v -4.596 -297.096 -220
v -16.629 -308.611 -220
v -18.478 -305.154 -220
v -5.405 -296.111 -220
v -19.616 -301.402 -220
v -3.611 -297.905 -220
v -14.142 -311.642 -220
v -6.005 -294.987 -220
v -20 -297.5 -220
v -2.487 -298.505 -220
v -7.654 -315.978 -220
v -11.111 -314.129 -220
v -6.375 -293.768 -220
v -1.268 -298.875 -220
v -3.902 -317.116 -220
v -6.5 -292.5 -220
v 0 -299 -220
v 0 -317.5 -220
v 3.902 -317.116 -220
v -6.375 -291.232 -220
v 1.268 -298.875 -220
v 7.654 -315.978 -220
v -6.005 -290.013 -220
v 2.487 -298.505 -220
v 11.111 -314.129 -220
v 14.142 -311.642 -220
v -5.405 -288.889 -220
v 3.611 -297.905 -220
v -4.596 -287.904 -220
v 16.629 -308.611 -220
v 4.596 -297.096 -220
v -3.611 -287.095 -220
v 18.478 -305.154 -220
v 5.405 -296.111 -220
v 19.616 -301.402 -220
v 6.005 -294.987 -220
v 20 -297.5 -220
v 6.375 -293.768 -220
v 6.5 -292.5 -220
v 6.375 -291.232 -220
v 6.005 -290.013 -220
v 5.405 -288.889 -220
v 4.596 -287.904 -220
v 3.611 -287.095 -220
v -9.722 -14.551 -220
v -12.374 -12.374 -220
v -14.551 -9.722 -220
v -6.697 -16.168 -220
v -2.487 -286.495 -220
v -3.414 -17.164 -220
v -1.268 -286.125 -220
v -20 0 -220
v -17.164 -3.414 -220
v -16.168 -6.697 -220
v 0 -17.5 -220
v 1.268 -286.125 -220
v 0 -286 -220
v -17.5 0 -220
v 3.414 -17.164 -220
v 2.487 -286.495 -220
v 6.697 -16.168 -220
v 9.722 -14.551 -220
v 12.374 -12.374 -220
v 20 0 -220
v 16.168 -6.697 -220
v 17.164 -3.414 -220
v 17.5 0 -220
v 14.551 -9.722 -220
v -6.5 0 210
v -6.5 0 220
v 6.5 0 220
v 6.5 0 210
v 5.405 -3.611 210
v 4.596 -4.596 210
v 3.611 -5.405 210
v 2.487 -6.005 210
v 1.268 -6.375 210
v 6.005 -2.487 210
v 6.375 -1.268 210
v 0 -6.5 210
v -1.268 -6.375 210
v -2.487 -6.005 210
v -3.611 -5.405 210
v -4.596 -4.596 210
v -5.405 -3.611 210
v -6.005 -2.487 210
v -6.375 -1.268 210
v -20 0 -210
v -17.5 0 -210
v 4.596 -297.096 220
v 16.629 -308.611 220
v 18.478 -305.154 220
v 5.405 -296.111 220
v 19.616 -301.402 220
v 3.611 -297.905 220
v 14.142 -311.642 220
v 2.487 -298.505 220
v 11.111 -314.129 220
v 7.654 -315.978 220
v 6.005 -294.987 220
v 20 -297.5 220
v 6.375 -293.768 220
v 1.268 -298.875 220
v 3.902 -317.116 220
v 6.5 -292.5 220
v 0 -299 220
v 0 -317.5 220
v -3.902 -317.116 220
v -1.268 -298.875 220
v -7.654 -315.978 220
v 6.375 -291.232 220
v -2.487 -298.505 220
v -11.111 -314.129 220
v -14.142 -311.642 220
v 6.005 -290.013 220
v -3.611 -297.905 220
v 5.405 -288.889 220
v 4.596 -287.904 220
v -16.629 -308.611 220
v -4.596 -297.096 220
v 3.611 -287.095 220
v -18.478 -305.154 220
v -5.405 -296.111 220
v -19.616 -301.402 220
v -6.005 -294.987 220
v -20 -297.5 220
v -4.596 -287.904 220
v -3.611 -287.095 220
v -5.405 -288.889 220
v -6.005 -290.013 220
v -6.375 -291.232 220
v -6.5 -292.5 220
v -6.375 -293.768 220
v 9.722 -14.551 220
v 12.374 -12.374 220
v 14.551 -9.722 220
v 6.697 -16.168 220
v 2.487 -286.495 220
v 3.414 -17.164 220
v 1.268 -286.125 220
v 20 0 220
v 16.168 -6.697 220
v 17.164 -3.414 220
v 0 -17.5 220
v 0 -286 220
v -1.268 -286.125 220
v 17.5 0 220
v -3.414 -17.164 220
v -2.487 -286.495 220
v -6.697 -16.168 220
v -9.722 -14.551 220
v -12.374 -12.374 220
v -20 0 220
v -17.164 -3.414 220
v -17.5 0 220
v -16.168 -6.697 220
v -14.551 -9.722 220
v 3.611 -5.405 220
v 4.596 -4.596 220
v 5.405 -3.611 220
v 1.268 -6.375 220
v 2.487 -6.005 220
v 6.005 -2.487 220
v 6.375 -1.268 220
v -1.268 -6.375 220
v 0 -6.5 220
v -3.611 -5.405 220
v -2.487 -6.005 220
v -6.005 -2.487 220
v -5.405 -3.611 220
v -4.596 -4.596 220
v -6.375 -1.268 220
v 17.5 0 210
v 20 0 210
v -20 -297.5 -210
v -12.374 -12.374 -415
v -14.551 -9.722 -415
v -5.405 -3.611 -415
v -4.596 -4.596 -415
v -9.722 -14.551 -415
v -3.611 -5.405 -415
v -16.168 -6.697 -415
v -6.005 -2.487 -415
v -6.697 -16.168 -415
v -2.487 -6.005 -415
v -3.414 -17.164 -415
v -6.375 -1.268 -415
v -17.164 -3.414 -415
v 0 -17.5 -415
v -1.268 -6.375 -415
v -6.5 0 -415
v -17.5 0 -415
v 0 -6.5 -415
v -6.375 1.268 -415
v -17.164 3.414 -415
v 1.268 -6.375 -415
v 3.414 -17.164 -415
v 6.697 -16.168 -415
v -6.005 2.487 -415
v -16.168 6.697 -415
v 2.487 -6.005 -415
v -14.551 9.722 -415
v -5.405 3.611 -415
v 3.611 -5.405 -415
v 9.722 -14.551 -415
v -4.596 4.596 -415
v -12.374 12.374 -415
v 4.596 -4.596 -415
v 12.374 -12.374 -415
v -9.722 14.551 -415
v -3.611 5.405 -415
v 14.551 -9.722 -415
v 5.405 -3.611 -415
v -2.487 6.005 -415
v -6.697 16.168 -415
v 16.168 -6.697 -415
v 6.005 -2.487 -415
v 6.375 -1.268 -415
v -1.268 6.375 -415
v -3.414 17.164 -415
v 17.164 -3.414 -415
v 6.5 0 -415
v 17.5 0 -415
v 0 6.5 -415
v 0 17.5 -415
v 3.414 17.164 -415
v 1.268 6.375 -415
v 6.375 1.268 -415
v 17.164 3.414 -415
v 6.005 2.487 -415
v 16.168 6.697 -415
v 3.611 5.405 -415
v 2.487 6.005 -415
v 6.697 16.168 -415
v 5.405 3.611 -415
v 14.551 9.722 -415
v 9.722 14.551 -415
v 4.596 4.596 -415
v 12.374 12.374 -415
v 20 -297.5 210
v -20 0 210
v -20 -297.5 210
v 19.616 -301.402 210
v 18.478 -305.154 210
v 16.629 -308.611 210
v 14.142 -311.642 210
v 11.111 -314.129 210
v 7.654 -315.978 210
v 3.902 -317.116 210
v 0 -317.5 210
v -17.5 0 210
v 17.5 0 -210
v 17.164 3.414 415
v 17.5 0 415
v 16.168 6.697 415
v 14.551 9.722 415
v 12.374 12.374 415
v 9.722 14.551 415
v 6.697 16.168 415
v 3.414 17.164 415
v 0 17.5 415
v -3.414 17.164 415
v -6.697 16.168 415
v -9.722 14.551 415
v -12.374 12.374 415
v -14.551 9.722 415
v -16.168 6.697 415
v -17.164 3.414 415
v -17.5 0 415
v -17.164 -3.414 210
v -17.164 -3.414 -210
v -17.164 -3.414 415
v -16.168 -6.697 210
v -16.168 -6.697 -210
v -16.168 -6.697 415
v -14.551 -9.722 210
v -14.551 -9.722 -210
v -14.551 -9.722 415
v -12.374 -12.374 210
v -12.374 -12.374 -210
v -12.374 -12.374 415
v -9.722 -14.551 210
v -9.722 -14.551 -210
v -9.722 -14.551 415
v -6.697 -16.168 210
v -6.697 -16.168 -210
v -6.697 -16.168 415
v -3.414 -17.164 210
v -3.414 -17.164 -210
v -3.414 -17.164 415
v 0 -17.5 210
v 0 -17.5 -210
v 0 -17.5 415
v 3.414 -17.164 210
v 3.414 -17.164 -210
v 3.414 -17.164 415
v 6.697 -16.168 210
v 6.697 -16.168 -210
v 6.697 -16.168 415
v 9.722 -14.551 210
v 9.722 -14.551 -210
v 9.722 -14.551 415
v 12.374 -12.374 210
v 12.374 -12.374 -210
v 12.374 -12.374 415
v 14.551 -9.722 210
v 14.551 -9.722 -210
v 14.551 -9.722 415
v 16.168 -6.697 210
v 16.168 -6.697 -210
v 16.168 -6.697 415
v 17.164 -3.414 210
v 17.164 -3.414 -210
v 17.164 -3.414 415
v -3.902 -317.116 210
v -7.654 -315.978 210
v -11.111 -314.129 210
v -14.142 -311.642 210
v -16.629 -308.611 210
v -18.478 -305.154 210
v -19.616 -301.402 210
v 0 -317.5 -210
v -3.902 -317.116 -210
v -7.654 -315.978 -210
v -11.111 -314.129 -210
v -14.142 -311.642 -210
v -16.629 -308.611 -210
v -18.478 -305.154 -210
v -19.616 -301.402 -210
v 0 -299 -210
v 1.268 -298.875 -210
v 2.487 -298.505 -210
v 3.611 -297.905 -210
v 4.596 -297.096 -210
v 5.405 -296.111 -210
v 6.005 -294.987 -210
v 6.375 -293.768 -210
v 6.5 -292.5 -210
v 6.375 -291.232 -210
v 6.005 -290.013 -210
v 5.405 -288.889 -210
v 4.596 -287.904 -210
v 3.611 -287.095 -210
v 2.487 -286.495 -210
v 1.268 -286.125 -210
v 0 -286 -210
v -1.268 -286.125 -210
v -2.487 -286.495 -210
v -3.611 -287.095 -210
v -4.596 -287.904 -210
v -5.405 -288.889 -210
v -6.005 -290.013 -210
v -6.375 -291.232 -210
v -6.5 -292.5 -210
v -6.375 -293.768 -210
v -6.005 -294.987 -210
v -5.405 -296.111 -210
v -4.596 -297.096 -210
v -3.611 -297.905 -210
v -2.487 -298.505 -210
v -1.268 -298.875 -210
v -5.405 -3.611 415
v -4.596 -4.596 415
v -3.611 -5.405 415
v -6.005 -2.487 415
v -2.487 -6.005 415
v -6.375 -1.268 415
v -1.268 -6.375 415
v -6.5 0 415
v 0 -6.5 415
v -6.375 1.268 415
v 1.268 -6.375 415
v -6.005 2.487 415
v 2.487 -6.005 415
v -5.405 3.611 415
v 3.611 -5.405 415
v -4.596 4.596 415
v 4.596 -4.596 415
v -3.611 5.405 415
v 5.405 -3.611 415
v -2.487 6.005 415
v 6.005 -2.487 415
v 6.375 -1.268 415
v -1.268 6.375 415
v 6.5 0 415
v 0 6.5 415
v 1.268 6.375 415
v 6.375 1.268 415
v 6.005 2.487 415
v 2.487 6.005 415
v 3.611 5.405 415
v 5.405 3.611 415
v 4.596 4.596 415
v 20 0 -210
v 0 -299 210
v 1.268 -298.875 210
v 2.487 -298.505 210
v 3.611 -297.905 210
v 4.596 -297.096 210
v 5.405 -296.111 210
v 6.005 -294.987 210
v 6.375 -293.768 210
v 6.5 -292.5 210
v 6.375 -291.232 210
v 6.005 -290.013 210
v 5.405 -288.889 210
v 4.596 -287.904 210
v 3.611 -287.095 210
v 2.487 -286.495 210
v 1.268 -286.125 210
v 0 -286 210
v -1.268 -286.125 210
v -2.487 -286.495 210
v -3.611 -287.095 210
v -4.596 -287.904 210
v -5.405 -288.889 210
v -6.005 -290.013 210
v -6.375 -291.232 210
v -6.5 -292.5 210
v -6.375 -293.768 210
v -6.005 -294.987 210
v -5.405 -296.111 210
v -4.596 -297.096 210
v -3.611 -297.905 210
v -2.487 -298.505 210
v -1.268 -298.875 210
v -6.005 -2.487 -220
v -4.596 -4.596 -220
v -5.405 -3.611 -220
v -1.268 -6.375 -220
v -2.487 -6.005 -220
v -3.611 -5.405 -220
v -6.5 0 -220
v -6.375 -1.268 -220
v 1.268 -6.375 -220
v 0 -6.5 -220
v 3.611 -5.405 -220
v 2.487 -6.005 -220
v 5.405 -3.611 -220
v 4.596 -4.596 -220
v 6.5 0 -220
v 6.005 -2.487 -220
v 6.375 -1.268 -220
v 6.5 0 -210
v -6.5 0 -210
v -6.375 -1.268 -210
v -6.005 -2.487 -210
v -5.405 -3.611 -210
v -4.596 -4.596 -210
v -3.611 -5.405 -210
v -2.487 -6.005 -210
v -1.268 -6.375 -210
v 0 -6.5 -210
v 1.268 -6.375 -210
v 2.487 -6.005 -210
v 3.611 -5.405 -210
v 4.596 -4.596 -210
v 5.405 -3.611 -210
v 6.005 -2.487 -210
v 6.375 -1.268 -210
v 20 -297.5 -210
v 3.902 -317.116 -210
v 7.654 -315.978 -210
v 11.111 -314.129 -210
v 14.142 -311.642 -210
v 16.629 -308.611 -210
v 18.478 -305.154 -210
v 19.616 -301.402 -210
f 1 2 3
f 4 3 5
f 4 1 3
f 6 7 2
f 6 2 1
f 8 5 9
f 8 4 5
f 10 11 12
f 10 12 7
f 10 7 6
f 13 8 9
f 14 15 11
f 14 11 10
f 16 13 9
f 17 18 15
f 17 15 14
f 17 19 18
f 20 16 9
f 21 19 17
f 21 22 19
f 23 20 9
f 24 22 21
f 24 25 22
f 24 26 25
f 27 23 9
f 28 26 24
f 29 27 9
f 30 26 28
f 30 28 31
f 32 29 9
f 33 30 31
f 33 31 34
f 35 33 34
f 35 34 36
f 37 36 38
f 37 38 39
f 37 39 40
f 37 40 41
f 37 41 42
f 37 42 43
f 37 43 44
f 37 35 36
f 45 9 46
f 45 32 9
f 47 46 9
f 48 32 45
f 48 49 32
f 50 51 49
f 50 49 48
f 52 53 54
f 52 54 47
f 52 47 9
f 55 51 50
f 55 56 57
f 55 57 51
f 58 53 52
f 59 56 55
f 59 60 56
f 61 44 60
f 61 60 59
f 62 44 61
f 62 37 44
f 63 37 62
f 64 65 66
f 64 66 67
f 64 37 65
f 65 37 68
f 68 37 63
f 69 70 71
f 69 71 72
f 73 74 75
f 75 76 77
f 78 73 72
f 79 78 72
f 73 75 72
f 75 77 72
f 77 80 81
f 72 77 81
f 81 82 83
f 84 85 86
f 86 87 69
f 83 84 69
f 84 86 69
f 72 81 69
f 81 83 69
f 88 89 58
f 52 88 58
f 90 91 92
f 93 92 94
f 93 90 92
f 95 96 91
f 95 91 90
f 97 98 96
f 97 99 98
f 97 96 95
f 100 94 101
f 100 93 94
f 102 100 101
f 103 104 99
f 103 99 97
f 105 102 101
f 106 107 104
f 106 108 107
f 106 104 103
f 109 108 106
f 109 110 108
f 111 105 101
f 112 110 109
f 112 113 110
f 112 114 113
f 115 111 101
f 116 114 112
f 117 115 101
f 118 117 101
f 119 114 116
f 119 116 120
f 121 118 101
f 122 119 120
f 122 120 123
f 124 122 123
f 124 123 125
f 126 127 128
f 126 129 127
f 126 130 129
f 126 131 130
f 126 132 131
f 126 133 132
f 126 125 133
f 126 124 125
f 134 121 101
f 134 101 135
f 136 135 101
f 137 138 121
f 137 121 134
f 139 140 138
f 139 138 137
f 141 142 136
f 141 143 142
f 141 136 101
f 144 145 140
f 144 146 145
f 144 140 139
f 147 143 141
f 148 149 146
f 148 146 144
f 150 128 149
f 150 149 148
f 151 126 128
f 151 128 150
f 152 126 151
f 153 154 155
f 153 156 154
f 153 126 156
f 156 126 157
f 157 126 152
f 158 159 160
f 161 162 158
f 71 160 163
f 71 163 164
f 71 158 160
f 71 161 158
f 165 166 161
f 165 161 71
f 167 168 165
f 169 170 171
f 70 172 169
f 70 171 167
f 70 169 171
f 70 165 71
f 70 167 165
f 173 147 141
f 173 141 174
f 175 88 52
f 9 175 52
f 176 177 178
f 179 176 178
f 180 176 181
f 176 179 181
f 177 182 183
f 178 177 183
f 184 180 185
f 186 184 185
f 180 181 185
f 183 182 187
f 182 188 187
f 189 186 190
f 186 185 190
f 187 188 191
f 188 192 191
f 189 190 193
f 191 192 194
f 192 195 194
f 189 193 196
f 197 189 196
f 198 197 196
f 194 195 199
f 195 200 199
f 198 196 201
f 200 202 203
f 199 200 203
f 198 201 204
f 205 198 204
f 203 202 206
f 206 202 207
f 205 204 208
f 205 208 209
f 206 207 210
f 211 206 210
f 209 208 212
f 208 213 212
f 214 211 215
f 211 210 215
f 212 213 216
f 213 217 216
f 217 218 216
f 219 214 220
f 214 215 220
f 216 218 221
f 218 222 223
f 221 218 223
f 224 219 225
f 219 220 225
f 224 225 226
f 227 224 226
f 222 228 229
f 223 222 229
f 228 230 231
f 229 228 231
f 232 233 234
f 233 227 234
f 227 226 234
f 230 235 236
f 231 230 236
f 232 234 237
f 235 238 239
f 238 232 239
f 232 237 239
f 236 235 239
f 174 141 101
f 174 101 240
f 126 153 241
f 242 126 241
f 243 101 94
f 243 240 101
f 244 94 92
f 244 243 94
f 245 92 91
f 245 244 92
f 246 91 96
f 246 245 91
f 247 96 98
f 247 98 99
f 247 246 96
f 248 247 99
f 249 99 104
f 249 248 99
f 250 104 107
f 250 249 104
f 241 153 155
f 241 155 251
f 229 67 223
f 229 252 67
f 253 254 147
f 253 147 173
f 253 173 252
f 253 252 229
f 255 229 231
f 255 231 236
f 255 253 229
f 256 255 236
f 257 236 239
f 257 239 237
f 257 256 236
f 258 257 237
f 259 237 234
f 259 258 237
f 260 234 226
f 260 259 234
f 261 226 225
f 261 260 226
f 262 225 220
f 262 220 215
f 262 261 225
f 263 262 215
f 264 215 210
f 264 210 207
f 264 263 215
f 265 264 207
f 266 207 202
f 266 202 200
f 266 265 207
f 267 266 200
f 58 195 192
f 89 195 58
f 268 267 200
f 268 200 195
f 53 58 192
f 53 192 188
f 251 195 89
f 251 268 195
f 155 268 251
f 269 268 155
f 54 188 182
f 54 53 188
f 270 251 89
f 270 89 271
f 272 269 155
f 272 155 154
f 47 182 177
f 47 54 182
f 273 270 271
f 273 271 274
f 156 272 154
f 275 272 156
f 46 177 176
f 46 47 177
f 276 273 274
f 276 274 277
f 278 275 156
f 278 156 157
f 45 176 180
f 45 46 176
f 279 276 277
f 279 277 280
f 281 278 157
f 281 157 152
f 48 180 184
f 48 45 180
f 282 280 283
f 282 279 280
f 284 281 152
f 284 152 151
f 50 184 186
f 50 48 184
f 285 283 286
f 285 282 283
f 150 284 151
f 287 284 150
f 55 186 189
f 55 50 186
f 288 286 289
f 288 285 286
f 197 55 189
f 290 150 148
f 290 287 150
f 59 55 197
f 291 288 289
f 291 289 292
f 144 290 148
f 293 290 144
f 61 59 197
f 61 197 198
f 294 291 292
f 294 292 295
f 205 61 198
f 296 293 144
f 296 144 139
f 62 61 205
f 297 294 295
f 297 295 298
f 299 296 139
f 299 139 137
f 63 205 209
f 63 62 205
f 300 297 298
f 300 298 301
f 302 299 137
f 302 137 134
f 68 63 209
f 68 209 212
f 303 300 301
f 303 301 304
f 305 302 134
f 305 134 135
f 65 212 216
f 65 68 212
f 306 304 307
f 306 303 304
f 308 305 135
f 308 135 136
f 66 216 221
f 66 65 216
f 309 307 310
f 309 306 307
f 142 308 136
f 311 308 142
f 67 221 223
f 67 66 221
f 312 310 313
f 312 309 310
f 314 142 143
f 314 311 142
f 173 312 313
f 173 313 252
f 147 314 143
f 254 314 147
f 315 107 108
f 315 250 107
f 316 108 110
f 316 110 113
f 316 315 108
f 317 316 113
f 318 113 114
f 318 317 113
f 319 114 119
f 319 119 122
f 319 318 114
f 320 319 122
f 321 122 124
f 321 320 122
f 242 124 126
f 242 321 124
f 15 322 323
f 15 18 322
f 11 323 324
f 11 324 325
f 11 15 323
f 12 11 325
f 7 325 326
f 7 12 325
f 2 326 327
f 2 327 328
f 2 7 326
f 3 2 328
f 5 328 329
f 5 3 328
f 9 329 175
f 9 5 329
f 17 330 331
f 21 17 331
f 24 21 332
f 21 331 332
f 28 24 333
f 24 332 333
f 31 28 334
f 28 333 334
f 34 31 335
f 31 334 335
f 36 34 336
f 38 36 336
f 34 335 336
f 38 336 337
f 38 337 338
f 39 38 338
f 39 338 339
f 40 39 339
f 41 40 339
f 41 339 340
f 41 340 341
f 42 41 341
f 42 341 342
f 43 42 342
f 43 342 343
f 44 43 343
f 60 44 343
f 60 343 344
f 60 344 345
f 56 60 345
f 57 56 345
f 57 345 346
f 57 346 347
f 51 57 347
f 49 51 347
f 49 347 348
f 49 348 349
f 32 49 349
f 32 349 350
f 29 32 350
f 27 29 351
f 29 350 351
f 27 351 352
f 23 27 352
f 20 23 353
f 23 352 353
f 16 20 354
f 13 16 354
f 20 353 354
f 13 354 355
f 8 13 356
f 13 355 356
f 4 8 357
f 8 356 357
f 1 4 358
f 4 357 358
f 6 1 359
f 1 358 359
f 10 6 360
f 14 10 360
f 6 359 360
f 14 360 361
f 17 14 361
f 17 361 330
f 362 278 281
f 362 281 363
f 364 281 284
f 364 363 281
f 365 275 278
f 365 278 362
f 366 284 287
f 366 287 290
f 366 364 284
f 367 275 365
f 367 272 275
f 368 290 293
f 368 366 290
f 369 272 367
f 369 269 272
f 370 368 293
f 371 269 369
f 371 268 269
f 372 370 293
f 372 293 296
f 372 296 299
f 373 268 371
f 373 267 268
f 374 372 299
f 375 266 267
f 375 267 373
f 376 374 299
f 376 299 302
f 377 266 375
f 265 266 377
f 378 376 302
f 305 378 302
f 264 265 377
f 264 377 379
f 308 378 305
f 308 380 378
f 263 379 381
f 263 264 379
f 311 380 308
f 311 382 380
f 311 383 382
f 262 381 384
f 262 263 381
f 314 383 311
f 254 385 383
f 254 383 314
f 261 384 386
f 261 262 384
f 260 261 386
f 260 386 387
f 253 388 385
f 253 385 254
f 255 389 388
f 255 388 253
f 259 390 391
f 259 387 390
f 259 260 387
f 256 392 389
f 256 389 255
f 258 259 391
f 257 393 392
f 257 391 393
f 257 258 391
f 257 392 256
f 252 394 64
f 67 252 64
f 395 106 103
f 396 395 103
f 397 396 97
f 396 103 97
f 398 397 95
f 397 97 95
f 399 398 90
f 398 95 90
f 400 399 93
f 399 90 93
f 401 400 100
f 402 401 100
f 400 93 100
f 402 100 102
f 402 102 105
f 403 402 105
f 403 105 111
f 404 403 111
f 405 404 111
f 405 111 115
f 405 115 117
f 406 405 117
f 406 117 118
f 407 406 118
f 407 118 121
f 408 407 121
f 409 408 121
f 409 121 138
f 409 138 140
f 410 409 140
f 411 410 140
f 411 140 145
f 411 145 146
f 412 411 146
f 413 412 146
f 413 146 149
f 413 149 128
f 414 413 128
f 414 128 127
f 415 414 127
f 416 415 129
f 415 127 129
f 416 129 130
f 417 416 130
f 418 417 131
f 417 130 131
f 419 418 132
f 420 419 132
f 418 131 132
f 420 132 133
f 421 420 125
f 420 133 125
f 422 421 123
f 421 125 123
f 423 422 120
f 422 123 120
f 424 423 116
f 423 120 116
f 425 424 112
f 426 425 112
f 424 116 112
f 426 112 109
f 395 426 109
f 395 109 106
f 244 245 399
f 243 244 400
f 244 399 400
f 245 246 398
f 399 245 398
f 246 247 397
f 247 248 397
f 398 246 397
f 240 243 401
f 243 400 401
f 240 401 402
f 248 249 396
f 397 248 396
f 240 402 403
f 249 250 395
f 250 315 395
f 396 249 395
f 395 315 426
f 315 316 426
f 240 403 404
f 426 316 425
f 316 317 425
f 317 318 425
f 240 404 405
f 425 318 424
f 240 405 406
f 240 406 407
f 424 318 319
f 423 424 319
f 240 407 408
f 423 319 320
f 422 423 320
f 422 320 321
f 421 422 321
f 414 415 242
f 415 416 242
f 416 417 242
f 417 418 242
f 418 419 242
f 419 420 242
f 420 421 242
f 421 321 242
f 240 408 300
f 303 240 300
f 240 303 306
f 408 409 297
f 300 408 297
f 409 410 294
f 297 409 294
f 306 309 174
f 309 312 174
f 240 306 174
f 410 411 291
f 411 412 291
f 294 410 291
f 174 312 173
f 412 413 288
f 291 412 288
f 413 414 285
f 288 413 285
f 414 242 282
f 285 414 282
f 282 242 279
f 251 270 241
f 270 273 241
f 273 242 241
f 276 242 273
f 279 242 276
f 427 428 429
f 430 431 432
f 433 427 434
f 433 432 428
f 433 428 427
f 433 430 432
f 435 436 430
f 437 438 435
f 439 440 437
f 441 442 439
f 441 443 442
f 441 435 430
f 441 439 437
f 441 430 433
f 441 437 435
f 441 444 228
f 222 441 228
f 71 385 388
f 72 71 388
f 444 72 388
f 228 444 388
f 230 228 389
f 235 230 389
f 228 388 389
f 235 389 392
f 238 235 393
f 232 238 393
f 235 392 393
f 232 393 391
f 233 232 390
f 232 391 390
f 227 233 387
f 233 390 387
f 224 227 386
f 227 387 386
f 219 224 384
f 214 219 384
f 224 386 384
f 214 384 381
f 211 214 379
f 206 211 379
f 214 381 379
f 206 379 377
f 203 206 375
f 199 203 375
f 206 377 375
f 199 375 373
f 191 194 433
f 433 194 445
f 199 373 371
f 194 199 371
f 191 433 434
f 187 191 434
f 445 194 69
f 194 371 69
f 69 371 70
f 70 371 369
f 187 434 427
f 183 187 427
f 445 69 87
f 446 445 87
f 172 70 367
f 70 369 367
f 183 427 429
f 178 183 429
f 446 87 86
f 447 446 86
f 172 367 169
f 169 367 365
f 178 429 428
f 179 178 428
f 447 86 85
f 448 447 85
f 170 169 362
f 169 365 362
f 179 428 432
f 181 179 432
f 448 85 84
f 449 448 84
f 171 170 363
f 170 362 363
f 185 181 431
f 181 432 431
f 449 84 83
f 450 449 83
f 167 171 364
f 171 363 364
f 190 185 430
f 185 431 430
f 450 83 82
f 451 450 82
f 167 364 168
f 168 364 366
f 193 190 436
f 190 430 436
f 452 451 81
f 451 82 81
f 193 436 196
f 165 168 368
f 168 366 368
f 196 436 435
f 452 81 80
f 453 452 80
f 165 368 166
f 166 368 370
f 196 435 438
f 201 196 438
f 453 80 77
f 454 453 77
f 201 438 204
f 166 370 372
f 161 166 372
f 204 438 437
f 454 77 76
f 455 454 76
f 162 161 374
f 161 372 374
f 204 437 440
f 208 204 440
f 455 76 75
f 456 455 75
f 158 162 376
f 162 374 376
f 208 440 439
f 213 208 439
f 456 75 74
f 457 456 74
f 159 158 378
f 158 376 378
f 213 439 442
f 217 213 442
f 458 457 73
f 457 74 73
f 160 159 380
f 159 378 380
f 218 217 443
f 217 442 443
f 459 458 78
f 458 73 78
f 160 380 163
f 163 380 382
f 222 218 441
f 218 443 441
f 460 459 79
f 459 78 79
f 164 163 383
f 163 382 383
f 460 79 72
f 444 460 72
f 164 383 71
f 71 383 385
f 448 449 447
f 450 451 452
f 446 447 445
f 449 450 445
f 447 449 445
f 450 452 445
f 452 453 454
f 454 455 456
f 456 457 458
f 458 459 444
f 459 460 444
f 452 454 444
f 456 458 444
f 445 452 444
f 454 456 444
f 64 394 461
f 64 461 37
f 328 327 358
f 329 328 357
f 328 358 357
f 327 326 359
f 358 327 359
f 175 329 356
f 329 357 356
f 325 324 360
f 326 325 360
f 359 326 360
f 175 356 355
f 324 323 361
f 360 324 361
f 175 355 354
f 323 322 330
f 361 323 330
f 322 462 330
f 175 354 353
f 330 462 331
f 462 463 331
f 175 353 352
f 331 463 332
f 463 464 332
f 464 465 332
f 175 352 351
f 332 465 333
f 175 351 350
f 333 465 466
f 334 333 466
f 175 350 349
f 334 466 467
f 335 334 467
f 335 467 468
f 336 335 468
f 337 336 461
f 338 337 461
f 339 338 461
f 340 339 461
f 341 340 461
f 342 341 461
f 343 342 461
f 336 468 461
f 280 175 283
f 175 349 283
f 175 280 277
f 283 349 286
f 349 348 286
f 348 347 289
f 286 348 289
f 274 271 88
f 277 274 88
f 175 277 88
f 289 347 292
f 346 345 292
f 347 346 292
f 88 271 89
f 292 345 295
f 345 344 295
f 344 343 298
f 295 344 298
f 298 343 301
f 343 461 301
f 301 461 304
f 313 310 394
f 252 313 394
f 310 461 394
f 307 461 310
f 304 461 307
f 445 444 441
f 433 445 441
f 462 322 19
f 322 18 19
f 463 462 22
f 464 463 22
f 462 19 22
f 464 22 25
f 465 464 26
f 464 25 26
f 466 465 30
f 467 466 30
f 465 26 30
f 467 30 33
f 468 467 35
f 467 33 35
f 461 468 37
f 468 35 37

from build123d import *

# Parameters (mm, degrees)
SKETCH1_R           = 17.5
BOSS_EXTRUDE1_DEPTH = 415
CUT_EXTRUDE1_REACH  = 832.369
SKETCH2_R           = 6.5
SKETCH3_W           = 10
SKETCH3_H           = 317.5
BOSS_EXTRUDE2_DEPTH = 20
FILLET1_R           = 20
SKETCH4_R           = 6.5
CUT_EXTRUDE2_DEPTH  = 542


with BuildPart() as part:
    # Sketch1 → Boss-Extrude1 (new, symmetric)
    with BuildSketch(Plane.XY):
        Circle(SKETCH1_R)
    extrude(amount=BOSS_EXTRUDE1_DEPTH, both=True)

    # Sketch2 → Cut-Extrude1 (cut, up to next)
    with BuildSketch(Plane.XY.offset(415), mode=Mode.PRIVATE) as cut_extrude1_sk1:
        Circle(SKETCH2_R)
    cut_extrude1_tool1 = extrude(cut_extrude1_sk1.sketch, amount=-CUT_EXTRUDE1_REACH, mode=Mode.PRIVATE) & part.part
    add(cut_extrude1_tool1.solids().sort_by_distance((0, 0, 415))[0], mode=Mode.SUBTRACT)

    # Sketch3 → Boss-Extrude2 (add, symmetric)
    with BuildSketch(Plane(origin=(0, 0, 0), x_dir=(0, 0, -1), z_dir=(1, 0, 0))):
        with Locations((-215, -158.75)):
            Rectangle(SKETCH3_W, SKETCH3_H)
        with Locations((215, -158.75)):
            Rectangle(SKETCH3_W, SKETCH3_H)
    extrude(amount=BOSS_EXTRUDE2_DEPTH, both=True)

    # Fillet1
    fillet1_edges = [part.edges().sort_by_distance(p)[0] for p in [
        (-20, -317.5, -215),
        (20, -317.5, -215),
        (-20, -317.5, 215),
        (20, -317.5, 215),
    ]]
    fillet(fillet1_edges, radius=FILLET1_R - 0.0001)  # a hair under: the kernel refuses the full size

    # Sketch4 → Cut-Extrude2 (cut)
    with BuildSketch(Plane.XY.offset(220)):
        with Locations(Location((0, -292.5, 0), (0, 0, 270))):
            Circle(SKETCH4_R)
    extrude(amount=-CUT_EXTRUDE2_DEPTH, mode=Mode.SUBTRACT)


solid = part.part
